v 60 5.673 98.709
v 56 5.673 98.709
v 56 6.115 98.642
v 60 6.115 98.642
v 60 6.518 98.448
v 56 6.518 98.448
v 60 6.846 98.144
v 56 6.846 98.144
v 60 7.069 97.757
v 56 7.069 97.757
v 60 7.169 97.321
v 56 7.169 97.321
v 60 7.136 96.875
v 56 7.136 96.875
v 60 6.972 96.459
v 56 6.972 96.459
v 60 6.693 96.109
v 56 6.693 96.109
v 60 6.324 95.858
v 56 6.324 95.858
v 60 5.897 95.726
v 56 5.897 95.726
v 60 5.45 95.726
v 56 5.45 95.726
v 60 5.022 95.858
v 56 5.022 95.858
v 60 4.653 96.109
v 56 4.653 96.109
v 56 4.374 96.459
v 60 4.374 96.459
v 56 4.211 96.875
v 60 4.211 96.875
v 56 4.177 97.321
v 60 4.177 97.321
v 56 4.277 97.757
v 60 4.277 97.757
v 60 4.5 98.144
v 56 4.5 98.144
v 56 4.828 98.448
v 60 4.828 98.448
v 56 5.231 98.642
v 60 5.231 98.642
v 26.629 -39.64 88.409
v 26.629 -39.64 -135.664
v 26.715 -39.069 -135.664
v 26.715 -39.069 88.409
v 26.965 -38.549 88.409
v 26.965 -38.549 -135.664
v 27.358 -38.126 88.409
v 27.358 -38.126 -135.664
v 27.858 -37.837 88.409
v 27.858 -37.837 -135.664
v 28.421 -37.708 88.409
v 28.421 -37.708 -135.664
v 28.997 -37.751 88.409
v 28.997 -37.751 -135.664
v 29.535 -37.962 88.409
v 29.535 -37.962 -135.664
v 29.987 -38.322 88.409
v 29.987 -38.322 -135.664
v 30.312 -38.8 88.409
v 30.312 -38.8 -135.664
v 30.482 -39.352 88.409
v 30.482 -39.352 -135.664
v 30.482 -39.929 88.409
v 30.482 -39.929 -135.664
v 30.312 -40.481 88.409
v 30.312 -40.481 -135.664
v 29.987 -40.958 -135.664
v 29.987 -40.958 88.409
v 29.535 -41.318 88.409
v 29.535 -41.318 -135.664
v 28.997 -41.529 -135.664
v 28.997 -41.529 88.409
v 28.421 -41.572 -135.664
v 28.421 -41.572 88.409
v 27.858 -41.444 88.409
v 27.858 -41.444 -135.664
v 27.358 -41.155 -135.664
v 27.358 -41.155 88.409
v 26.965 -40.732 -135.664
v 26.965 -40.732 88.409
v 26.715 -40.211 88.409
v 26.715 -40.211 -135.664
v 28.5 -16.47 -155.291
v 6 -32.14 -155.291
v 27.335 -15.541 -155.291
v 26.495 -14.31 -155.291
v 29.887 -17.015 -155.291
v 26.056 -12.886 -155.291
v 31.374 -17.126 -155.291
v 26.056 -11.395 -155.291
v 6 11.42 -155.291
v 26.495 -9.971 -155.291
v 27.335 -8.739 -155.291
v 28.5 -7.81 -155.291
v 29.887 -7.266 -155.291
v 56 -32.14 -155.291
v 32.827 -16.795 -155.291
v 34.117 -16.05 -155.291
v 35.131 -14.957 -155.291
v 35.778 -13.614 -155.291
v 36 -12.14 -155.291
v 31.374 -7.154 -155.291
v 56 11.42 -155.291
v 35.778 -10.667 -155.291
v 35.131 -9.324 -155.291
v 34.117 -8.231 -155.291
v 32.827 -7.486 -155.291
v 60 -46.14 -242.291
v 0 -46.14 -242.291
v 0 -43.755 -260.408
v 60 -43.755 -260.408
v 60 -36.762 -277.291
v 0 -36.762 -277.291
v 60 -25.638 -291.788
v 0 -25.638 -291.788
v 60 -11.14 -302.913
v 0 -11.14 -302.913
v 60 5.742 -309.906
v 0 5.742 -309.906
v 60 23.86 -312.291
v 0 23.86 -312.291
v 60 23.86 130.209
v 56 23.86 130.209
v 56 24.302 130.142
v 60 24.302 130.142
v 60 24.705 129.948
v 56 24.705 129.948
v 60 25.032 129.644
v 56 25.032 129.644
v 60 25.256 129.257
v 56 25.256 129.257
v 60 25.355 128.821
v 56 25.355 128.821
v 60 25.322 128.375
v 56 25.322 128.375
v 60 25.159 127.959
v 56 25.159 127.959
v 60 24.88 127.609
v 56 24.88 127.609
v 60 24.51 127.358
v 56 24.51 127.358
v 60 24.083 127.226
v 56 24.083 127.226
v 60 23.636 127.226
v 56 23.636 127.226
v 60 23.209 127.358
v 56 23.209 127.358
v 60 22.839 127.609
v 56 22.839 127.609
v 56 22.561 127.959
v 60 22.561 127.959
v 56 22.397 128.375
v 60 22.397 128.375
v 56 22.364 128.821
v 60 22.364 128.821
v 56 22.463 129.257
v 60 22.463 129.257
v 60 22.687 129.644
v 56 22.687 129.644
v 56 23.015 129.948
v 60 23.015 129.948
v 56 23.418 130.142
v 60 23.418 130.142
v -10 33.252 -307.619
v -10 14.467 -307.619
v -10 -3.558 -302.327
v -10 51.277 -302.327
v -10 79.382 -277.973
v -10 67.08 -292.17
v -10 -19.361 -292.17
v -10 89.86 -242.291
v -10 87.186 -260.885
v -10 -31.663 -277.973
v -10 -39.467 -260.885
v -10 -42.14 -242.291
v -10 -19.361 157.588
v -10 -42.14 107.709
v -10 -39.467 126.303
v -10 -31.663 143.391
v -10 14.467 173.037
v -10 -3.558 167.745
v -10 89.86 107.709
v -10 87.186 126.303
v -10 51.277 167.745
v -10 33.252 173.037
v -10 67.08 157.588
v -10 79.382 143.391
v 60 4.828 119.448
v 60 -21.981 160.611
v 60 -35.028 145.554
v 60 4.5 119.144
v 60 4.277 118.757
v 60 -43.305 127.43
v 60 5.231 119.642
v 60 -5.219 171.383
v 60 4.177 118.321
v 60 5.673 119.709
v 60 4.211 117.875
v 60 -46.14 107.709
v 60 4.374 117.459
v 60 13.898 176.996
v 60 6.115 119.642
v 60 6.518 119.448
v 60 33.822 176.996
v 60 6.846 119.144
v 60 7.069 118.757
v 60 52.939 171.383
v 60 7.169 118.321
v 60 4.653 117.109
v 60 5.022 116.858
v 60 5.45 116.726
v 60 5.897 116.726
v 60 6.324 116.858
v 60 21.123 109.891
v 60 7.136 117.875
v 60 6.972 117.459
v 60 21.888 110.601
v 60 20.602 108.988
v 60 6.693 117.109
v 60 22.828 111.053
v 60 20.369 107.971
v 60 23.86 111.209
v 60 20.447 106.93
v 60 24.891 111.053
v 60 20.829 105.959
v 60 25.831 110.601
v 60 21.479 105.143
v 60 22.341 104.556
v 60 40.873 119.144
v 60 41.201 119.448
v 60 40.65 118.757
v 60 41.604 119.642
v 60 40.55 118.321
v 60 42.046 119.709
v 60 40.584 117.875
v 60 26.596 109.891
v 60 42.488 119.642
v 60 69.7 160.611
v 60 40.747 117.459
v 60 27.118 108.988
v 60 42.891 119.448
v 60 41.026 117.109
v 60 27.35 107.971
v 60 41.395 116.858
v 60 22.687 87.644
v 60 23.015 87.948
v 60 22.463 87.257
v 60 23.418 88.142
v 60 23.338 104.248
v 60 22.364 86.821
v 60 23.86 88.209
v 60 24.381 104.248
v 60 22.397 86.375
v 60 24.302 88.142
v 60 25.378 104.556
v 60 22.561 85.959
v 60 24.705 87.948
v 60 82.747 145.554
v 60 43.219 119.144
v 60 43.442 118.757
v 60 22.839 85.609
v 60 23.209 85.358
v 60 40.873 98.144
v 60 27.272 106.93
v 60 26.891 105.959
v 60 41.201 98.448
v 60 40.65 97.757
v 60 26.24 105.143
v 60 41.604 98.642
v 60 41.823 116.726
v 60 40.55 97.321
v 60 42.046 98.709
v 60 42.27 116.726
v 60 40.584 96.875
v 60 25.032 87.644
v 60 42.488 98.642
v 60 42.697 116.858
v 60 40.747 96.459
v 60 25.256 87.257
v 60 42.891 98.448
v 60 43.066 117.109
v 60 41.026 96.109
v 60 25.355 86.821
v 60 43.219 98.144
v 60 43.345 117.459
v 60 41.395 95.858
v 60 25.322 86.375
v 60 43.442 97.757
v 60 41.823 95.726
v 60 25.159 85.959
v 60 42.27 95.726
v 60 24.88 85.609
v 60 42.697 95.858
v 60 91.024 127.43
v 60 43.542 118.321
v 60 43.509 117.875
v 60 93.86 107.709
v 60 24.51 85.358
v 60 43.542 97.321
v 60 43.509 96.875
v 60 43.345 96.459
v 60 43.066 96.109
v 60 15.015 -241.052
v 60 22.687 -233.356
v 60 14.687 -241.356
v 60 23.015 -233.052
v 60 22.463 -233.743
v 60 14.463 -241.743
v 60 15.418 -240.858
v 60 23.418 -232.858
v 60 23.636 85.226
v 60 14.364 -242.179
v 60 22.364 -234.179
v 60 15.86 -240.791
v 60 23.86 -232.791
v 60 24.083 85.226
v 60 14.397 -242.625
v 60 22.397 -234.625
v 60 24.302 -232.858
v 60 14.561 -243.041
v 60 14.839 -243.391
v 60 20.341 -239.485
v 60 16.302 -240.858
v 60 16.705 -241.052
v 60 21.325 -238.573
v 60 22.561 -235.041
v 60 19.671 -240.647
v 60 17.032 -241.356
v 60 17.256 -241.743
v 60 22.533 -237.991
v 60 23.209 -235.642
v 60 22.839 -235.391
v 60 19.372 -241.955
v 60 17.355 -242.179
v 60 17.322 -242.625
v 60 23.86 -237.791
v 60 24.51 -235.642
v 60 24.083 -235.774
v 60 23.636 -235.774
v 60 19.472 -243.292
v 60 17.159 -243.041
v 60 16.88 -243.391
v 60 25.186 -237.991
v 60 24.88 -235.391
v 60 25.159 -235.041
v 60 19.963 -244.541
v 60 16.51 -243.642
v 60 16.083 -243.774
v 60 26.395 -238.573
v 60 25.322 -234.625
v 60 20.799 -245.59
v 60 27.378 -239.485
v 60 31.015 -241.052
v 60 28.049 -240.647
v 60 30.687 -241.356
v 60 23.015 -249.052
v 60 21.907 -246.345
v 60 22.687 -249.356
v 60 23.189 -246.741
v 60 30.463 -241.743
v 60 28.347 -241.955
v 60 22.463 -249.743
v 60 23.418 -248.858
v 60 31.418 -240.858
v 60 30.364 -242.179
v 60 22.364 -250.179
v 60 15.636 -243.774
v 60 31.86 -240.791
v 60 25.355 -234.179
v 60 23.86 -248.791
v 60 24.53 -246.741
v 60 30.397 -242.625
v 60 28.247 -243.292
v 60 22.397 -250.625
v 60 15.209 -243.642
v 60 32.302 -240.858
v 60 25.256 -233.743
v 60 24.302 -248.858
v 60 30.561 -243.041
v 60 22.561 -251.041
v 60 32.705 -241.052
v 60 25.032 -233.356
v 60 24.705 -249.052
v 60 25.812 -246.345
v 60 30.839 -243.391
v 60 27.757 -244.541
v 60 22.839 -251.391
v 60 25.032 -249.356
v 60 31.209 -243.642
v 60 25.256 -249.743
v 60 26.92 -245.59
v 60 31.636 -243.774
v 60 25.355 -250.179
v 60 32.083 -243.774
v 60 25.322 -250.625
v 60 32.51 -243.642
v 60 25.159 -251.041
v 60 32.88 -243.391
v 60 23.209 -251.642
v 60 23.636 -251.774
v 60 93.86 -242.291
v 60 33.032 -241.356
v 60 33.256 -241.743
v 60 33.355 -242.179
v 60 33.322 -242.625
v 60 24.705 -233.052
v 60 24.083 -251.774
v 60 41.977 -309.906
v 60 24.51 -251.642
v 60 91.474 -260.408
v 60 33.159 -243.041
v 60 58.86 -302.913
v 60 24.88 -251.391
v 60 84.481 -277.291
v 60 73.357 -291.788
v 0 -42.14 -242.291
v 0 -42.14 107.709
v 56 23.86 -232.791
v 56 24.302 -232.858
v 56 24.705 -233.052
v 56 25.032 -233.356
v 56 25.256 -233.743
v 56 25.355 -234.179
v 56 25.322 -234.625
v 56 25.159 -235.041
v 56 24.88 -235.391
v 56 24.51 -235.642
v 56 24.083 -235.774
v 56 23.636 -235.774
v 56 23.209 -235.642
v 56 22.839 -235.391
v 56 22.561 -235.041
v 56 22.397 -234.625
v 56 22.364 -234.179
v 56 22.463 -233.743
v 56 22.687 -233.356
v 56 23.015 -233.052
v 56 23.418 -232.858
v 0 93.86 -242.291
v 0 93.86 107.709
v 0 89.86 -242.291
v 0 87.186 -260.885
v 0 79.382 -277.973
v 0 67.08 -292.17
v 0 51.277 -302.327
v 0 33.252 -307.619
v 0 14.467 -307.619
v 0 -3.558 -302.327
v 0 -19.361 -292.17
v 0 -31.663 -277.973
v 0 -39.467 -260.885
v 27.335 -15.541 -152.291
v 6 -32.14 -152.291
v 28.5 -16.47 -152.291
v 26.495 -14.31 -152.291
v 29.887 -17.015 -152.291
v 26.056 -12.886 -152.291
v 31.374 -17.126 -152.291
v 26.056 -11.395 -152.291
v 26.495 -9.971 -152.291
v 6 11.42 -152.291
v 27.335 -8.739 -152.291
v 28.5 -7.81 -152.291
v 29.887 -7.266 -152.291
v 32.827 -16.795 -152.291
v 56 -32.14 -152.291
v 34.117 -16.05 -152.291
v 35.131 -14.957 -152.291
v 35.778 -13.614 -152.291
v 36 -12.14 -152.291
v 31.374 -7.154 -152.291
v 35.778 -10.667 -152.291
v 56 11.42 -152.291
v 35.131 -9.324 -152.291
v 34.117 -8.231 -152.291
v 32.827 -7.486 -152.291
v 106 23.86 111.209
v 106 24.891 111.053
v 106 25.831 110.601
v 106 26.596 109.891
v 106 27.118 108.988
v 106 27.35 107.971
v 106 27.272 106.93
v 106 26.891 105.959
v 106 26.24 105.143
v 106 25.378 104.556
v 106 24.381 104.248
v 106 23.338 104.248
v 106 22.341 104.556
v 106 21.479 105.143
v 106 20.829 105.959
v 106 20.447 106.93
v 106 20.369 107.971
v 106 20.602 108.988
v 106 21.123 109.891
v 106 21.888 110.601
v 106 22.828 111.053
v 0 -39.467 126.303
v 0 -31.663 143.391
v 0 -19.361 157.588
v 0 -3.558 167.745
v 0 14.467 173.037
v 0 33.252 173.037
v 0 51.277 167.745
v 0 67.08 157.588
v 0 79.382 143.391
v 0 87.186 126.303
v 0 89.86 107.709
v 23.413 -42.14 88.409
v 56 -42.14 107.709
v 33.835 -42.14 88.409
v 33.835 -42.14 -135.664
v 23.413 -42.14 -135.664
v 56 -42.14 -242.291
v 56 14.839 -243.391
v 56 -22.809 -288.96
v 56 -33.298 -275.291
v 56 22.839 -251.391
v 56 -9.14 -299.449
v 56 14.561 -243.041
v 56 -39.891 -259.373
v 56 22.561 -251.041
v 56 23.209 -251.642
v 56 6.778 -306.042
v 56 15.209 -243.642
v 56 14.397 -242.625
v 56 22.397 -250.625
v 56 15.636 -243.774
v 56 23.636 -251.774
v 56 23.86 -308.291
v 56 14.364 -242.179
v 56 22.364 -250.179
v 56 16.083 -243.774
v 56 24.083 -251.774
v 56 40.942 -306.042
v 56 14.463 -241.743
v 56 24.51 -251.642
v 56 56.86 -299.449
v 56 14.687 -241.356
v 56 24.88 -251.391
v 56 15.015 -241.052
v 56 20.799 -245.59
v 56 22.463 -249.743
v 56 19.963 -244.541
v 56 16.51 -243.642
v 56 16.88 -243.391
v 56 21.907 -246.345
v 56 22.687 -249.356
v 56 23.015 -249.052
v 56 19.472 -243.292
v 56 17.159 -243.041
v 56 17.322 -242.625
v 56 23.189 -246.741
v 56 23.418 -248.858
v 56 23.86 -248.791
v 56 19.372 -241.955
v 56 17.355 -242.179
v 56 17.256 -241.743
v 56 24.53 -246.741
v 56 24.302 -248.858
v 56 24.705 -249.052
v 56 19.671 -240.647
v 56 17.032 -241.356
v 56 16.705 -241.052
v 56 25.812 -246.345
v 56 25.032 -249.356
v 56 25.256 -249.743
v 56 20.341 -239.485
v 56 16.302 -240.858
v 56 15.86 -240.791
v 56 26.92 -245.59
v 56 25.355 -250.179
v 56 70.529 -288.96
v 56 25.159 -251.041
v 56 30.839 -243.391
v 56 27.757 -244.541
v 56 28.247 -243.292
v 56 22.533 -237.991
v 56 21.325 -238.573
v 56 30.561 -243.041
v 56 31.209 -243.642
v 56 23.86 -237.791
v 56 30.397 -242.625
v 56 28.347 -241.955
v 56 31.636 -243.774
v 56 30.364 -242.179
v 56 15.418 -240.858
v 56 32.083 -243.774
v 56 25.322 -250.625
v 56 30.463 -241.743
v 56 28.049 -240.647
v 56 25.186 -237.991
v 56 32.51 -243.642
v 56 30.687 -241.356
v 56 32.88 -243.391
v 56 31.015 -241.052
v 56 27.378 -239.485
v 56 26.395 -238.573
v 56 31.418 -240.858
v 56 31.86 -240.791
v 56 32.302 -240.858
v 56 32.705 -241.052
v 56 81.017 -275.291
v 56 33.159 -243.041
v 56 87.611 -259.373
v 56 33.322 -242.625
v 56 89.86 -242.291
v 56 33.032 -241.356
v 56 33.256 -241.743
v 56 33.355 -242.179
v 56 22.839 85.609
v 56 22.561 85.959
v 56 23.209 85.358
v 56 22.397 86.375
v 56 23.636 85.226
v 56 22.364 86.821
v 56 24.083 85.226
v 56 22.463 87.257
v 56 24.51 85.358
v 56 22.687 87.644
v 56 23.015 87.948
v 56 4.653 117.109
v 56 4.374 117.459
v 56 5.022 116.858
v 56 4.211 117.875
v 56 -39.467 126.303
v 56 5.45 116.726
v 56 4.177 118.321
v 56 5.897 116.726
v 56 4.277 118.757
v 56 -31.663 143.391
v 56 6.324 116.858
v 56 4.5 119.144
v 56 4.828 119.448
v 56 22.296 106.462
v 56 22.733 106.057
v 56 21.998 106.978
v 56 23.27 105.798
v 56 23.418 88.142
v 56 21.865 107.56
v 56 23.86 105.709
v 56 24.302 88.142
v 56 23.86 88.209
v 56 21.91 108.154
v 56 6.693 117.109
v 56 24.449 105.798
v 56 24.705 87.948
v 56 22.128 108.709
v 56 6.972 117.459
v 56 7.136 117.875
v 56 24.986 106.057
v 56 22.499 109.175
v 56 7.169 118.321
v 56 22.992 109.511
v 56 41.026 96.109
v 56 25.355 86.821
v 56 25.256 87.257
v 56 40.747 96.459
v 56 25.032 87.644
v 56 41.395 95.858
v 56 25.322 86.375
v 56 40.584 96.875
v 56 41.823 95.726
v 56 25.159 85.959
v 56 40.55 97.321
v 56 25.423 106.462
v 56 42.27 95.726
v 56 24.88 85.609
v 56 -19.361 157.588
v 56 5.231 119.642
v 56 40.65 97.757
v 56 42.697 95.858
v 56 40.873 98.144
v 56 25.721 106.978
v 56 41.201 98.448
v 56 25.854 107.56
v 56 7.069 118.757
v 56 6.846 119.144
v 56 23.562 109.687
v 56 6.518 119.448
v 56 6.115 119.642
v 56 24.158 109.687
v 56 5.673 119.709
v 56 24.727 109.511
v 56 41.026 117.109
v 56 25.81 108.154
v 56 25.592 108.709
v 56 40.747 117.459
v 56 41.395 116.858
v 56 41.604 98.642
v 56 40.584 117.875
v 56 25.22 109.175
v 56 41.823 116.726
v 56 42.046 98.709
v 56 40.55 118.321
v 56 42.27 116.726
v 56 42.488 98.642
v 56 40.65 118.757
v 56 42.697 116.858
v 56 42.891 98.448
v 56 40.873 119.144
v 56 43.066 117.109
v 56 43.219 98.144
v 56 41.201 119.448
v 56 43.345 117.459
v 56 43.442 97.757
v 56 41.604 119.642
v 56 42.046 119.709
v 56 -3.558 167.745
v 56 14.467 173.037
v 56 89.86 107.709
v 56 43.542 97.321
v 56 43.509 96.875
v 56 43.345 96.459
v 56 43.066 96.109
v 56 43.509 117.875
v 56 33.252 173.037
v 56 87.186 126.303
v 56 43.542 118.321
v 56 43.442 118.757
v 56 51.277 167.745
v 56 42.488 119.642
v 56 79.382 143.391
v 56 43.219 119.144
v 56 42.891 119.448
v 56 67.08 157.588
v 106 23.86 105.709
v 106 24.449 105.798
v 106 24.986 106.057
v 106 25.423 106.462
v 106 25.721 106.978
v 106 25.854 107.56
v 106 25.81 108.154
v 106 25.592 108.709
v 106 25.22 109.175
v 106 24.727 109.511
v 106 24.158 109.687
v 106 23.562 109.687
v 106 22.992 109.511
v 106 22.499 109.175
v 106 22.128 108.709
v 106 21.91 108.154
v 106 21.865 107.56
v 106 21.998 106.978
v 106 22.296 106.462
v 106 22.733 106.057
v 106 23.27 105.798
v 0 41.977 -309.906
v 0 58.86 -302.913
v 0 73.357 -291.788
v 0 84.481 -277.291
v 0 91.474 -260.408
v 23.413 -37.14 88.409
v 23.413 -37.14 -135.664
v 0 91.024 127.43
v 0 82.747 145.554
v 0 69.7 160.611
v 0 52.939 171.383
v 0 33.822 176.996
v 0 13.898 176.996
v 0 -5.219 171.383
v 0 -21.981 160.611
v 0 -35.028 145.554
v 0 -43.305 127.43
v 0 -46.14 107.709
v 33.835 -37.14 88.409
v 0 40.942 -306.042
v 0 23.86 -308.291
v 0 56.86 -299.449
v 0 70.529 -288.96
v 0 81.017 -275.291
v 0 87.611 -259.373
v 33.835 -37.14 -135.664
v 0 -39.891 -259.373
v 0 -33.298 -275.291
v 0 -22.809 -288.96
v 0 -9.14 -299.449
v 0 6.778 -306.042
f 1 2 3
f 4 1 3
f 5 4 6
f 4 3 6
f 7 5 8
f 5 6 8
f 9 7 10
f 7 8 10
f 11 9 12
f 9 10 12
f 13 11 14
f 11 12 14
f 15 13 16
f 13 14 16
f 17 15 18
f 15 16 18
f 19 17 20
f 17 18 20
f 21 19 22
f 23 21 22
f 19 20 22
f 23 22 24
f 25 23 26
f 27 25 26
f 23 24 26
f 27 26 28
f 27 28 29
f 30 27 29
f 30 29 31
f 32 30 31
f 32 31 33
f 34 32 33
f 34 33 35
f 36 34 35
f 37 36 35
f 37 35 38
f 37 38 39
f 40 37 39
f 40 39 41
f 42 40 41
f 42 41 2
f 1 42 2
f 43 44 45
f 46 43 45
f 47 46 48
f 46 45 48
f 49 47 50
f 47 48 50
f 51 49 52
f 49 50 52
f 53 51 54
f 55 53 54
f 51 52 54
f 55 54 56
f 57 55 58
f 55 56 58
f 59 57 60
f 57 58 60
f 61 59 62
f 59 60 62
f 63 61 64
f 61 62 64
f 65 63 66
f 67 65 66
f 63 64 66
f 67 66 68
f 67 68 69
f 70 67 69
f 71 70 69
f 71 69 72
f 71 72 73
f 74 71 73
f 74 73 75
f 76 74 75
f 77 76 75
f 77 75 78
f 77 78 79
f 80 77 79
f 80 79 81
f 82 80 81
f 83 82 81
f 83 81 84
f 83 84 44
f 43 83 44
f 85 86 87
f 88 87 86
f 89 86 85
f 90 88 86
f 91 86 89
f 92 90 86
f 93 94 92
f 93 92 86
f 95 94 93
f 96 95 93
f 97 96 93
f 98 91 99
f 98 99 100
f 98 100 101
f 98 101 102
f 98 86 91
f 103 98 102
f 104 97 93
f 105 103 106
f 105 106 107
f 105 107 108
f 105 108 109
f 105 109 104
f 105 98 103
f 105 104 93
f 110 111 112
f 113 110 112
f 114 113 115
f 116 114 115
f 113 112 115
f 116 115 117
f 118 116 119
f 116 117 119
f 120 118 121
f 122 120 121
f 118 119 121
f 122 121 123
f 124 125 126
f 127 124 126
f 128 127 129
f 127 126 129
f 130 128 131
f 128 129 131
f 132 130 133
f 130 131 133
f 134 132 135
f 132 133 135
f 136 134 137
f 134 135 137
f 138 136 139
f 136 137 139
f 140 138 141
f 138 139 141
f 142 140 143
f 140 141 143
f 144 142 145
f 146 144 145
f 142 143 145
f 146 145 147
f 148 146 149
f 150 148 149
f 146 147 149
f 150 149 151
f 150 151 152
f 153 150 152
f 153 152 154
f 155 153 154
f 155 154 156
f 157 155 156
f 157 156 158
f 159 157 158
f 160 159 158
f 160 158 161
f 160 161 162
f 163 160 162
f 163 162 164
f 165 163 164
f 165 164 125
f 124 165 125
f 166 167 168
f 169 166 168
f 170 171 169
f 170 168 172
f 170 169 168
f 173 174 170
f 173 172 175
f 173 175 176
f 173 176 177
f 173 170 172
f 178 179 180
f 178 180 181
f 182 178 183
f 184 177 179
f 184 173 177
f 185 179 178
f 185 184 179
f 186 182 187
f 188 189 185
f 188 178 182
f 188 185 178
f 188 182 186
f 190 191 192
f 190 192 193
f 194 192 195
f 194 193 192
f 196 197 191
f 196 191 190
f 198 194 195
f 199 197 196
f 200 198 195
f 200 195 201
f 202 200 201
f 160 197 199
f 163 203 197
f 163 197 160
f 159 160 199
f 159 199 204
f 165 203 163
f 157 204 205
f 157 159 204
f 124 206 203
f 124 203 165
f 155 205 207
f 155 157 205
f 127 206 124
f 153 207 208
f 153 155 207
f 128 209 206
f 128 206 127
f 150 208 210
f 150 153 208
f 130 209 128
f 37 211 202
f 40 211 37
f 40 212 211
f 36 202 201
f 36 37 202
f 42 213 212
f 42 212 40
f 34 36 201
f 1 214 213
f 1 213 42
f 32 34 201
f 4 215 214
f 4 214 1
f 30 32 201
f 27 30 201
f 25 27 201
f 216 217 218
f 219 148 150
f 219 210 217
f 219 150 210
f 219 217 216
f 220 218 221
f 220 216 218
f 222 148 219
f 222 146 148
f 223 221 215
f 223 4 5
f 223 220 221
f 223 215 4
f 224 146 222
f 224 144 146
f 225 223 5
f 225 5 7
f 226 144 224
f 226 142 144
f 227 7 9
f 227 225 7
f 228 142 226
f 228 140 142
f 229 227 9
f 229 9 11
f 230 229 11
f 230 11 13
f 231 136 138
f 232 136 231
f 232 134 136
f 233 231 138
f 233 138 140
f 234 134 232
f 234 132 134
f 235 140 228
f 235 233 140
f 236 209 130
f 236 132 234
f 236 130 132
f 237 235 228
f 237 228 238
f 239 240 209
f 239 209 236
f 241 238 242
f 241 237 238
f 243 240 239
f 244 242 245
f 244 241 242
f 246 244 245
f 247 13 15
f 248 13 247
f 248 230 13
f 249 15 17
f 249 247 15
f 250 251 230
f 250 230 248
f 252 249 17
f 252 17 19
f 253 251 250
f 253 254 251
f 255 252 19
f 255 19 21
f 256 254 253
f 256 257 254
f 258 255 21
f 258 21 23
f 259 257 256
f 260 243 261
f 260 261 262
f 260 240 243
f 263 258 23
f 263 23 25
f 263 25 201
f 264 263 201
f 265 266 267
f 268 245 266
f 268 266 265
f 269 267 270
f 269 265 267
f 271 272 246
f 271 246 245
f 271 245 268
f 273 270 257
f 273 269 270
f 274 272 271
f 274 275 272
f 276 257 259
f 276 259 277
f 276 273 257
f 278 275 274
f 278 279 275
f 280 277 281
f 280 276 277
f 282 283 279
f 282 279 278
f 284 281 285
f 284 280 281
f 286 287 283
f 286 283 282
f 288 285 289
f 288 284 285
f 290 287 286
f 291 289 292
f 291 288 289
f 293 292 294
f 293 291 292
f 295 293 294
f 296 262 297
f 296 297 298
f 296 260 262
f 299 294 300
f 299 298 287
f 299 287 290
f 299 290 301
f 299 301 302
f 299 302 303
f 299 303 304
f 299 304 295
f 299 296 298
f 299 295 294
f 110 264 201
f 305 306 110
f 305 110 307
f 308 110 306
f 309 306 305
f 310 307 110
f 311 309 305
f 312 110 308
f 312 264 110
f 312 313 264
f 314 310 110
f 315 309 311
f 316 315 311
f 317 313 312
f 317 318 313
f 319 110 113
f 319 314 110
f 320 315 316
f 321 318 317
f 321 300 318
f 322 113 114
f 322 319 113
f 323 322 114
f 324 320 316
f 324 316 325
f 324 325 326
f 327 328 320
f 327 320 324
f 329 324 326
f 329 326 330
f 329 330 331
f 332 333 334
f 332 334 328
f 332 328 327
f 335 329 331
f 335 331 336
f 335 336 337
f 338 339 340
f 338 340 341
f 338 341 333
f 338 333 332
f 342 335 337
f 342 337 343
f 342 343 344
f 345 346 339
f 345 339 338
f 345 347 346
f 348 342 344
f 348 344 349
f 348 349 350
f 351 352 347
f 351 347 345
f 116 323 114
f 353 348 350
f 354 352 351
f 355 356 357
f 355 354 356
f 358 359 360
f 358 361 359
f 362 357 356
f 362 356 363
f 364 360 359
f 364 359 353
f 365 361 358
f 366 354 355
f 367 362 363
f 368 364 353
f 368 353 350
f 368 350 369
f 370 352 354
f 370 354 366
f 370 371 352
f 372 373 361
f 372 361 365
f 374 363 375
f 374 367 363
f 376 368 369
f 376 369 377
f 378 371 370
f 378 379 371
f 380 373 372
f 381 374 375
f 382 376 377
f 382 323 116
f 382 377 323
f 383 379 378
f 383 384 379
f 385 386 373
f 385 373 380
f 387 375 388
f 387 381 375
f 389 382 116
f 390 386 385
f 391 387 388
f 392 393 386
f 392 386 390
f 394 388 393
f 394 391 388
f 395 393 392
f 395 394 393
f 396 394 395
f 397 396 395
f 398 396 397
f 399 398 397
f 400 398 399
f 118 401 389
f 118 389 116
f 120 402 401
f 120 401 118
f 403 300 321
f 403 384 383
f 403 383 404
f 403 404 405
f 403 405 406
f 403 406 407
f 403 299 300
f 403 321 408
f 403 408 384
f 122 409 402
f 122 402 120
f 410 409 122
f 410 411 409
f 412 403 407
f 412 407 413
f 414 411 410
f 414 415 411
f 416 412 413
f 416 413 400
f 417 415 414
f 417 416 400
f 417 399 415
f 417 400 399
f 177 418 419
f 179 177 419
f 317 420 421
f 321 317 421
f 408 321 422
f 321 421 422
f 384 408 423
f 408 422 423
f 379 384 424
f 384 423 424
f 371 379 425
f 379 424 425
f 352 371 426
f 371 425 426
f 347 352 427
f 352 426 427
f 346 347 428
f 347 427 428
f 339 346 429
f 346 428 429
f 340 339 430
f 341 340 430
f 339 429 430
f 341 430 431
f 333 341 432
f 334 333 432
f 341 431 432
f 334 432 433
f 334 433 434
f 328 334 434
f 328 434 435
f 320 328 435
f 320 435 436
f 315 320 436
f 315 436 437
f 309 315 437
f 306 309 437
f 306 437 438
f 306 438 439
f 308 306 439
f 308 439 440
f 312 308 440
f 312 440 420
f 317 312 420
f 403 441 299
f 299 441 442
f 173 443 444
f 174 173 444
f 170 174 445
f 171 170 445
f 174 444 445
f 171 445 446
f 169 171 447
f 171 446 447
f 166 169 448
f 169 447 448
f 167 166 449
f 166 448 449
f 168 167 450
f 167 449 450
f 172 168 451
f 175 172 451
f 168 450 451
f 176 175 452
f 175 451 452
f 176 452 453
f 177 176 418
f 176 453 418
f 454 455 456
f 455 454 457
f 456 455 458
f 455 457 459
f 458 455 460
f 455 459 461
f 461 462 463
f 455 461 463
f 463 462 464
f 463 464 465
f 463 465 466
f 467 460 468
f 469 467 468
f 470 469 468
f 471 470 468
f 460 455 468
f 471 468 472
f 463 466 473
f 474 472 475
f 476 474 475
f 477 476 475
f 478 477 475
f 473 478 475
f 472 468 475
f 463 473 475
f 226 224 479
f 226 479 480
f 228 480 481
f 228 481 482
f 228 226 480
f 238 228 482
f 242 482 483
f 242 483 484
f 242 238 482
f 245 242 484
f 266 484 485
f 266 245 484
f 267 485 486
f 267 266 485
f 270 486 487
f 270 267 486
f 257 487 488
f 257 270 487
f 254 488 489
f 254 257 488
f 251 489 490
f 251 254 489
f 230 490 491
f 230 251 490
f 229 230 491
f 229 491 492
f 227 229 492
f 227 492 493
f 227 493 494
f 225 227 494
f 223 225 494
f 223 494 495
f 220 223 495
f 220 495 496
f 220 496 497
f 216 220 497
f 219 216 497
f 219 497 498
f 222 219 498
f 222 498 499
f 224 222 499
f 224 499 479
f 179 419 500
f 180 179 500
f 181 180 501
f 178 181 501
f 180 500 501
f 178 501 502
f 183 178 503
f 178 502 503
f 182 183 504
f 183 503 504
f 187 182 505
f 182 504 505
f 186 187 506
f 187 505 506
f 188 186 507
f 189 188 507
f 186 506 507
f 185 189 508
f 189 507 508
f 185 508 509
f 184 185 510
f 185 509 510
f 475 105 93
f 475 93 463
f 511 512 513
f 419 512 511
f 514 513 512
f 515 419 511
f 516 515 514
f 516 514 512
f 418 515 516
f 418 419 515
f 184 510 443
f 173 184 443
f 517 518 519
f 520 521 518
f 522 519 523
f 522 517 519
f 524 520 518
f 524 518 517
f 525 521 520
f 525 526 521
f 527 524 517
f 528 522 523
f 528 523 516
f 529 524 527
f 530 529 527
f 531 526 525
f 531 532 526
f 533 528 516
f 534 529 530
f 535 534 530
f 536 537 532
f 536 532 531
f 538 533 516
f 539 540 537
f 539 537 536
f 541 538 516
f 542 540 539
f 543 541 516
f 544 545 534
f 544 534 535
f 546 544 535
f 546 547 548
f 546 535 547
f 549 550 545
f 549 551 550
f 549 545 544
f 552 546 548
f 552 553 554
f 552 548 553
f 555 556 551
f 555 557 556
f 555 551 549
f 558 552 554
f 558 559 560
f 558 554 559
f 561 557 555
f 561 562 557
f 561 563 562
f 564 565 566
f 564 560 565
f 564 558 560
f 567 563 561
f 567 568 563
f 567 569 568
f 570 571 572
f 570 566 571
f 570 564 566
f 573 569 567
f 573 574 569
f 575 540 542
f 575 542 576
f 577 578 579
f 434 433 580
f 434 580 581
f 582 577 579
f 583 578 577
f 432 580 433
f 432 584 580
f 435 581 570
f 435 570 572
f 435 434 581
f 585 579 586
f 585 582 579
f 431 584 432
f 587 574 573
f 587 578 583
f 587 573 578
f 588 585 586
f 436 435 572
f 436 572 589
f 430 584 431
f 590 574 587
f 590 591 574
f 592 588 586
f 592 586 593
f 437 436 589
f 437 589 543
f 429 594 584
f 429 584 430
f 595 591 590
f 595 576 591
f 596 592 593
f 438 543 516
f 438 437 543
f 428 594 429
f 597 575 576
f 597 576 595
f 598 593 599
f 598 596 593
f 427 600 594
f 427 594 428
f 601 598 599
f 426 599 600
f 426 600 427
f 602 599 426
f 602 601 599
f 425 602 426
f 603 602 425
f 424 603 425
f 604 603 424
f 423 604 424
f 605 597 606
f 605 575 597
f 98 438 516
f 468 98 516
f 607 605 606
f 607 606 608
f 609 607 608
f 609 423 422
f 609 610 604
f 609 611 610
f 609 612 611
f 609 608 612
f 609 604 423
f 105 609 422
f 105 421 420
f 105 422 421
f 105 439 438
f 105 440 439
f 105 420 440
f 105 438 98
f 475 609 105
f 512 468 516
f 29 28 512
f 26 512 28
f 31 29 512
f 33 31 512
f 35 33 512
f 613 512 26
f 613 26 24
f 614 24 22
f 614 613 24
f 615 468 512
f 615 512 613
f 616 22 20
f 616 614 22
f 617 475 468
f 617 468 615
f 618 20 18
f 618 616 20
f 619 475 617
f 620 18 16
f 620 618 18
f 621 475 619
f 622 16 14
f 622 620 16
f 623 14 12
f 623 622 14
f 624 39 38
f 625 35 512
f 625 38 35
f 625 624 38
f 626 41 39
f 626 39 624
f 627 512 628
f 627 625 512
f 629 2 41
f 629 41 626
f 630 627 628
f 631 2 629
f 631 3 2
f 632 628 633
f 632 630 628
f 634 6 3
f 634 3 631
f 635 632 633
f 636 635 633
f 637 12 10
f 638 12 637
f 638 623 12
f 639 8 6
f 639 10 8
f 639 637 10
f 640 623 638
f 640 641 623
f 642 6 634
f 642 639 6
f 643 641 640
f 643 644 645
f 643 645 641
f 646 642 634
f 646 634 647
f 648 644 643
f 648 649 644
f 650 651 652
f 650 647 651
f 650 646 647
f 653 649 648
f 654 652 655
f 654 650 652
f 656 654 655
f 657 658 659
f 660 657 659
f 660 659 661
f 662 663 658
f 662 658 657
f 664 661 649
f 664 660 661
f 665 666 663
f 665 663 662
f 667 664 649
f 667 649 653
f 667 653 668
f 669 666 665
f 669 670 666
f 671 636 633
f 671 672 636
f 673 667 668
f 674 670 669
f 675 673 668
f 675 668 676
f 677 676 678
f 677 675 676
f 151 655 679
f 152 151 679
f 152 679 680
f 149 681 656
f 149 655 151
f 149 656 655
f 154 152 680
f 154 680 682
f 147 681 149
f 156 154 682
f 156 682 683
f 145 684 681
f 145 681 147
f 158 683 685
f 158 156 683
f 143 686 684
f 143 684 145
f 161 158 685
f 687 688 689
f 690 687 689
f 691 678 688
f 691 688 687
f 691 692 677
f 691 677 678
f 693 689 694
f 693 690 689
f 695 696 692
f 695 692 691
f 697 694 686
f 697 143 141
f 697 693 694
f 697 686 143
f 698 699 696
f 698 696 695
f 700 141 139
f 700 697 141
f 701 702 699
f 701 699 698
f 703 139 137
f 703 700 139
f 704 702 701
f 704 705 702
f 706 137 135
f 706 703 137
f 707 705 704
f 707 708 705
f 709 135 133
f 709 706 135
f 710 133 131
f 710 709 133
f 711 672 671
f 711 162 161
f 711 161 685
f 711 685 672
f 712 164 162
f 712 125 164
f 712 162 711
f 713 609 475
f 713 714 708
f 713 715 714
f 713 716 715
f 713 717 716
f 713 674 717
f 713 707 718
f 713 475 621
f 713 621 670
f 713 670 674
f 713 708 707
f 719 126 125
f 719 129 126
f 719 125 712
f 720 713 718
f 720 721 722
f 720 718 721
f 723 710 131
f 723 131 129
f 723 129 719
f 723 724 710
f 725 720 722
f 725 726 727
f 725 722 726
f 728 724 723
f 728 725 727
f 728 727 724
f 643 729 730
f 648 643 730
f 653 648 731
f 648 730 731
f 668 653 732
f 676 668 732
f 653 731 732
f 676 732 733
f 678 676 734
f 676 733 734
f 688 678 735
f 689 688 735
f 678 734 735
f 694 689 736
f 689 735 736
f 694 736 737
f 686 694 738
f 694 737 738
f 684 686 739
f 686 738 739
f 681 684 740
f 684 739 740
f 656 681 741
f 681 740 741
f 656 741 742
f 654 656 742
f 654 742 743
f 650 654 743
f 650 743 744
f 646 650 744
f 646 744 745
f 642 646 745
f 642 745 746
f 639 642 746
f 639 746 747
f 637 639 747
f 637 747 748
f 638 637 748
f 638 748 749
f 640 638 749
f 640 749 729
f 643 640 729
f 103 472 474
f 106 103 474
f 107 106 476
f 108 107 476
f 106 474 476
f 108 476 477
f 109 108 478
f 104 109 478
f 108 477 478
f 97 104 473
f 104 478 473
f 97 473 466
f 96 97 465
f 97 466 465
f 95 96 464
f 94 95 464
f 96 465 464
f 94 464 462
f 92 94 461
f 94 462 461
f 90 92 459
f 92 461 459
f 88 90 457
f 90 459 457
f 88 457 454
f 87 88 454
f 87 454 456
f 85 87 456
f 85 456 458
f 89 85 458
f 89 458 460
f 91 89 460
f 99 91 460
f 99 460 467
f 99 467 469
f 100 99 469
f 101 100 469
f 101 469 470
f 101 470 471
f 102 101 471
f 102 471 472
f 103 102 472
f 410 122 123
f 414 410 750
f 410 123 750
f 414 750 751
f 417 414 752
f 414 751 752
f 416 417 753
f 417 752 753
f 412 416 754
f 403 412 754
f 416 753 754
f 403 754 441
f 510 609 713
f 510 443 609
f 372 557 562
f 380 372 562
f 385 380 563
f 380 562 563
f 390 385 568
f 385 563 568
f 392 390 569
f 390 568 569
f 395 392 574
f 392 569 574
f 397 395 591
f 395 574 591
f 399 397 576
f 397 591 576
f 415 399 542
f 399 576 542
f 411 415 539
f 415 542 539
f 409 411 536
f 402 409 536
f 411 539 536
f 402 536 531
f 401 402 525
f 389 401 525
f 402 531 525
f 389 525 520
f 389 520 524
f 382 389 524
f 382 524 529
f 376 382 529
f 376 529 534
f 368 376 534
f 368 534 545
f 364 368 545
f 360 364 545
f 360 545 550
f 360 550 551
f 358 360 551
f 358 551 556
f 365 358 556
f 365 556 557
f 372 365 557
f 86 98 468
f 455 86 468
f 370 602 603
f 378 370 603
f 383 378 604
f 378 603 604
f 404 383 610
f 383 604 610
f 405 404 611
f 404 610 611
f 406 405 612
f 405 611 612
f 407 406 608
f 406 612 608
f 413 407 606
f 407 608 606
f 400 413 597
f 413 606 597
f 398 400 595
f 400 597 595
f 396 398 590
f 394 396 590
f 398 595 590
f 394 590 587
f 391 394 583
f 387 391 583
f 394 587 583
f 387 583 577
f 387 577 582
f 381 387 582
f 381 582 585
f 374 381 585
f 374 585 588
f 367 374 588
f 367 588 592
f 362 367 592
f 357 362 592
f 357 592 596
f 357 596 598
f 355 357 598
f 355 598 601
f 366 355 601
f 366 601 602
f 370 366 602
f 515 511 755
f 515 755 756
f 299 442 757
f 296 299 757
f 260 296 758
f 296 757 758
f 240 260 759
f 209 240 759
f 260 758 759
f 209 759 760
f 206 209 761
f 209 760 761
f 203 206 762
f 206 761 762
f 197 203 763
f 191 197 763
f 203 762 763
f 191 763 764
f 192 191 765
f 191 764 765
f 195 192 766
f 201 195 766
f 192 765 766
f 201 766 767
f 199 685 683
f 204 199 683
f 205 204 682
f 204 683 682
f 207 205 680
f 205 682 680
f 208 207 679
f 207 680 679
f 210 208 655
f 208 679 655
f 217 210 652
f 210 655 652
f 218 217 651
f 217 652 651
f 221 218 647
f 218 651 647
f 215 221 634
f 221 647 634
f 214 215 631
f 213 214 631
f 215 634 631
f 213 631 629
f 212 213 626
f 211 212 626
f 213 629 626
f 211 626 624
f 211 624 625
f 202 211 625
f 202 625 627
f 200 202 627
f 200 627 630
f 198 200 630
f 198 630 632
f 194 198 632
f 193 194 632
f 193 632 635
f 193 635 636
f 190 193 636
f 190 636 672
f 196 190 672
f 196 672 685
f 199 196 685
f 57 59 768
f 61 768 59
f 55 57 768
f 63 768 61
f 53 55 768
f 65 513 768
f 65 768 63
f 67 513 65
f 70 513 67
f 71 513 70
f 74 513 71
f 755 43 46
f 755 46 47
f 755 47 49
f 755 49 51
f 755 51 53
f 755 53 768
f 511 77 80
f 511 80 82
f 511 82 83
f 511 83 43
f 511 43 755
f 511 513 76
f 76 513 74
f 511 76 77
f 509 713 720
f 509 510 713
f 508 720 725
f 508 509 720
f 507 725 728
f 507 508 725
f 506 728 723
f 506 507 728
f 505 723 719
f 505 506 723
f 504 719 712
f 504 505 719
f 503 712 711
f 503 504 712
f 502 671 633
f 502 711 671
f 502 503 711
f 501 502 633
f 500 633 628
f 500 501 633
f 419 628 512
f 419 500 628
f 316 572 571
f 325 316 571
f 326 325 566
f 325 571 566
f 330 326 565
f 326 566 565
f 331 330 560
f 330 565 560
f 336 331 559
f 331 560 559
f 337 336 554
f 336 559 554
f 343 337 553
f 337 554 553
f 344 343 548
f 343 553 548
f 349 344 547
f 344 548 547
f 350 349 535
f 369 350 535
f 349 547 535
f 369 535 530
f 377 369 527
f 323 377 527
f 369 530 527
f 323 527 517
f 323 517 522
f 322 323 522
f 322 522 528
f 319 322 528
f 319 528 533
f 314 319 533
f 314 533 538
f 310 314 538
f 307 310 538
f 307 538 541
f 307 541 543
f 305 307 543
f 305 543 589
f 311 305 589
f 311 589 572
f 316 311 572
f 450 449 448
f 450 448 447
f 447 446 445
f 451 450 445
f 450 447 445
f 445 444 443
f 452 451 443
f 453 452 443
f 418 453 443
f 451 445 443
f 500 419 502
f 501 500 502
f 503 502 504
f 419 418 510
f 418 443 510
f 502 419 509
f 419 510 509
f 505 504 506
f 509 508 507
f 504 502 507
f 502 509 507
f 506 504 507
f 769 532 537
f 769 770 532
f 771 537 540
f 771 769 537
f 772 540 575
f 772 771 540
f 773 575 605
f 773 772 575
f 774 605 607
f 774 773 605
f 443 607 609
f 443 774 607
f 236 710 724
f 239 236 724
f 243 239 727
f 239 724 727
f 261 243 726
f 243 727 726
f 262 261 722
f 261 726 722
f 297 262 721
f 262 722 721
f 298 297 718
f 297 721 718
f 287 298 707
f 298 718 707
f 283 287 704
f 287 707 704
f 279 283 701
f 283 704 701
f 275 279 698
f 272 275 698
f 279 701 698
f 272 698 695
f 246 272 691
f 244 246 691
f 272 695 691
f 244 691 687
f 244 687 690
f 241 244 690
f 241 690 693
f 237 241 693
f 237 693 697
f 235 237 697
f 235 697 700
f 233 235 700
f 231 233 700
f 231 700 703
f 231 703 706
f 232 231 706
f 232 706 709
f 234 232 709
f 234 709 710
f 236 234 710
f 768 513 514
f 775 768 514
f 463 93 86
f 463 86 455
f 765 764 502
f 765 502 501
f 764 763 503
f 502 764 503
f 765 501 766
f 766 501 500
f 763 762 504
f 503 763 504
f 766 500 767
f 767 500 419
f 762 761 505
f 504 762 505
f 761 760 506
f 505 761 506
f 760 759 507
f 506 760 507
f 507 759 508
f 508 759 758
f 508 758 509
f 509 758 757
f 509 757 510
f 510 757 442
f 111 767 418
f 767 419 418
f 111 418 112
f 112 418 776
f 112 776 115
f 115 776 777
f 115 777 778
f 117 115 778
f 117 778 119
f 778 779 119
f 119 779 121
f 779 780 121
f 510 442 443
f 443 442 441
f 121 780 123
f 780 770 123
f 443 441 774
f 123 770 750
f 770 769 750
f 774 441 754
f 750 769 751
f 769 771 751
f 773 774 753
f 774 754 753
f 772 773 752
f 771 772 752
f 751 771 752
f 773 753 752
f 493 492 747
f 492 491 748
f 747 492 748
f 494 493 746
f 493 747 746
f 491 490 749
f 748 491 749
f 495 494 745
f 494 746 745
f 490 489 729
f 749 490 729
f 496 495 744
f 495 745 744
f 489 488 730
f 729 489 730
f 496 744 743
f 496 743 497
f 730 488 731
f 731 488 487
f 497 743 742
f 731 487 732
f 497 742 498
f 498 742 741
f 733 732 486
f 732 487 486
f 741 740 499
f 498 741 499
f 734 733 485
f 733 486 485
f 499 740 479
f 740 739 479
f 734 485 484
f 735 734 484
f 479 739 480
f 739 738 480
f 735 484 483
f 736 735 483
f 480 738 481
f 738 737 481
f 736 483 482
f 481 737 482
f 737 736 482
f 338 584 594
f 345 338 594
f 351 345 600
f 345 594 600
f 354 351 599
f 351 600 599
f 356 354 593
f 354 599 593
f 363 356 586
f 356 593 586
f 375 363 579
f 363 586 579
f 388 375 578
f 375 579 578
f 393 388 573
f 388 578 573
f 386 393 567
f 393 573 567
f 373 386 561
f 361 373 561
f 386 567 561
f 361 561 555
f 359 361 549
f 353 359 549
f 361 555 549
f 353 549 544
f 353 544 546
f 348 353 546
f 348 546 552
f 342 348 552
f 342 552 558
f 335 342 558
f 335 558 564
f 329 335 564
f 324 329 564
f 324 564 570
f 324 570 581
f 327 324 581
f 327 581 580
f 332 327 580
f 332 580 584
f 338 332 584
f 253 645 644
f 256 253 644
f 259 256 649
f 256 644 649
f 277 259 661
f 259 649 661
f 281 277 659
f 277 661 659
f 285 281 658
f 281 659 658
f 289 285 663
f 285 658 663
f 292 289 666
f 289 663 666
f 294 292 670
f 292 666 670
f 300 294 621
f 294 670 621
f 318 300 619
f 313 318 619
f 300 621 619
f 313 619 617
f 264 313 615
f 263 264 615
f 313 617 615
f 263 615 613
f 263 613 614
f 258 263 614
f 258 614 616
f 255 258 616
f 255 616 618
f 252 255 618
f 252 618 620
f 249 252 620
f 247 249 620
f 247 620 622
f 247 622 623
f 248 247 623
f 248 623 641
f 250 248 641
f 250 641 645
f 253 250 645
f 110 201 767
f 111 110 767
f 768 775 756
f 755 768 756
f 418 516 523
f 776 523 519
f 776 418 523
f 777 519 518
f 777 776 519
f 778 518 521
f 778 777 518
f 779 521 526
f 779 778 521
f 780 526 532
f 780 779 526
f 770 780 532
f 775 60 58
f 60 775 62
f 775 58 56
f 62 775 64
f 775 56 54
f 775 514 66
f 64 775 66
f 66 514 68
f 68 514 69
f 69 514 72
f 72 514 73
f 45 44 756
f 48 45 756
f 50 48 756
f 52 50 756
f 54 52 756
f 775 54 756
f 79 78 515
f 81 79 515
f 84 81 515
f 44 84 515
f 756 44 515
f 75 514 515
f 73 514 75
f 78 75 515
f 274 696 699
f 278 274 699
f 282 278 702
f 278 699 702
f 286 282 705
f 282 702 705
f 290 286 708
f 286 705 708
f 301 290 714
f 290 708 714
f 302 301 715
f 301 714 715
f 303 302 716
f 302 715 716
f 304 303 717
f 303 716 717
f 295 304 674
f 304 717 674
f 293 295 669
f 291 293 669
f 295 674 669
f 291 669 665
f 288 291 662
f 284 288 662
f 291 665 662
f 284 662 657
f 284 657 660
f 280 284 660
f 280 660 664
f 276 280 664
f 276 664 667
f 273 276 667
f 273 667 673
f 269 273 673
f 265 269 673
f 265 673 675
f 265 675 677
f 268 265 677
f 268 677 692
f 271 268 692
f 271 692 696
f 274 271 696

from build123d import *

# Parameters (mm, degrees)
BOSS_EXTRUDE1_DEPTH = 60
SHELL1_T            = -4
SKETCH4_R           = 1.5
CUT_EXTRUDE1_DEPTH  = 40
SKETCH6_R           = 4.5
CUT_EXTRUDE2_DEPTH  = 40
SKETCH7_R           = 1.5
CUT_EXTRUDE3_DEPTH  = 10
SKETCH8_R           = 3.5
BOSS_EXTRUDE2_DEPTH = 50
SKETCH9_W           = 3
SKETCH9_H           = 43.560021299
BOSS_EXTRUDE3_DEPTH = 50
SKETCH10_R          = 5
CUT_EXTRUDE4_DEPTH  = 30
BOSS_EXTRUDE4_DEPTH = 10
SKETCH13_R          = 2
CUT_EXTRUDE5_DEPTH  = 65
SKETCH17_W          = 10.421963941
SKETCH17_H          = 224.072224721
BOSS_EXTRUDE5_DEPTH = 9
SKETCH18_R          = 1.93755364
CUT_EXTRUDE6_DEPTH  = 239


with BuildPart() as part:
    # Sketch2 → Boss-Extrude1 (new body)
    with BuildSketch(Plane(origin=(0, 0, 0), x_dir=(0, 0, -1), z_dir=(1, 0, 0))):
        with BuildLine():
            Line((242.291021672, 93.859649123), (-107.708978328, 93.859649123))
            ThreePointArc((-107.708978328, 93.859649123), (-177.708978328, 23.859649123), (-107.708978328, -46.140350877))
            Line((-107.708978328, -46.140350877), (242.291021672, -46.140350877))
            ThreePointArc((242.291021672, -46.140350877), (312.291021672, 23.859649123), (242.291021672, 93.859649123))
        make_face()
    extrude(amount=BOSS_EXTRUDE1_DEPTH)

    # Shell1
    shell1_openings = [part.faces().sort_by_distance(p)[0] for p in [
        (0, 23.859649123, -67.291021672),
    ]]
    offset(amount=SHELL1_T, openings=shell1_openings, kind=Kind.INTERSECTION)

    # Sketch4 → Cut-Extrude1 (cut)
    with BuildSketch(Plane.ZY.offset(-56)):
        with Locations((-242.291021672, 31.859649123)):
            Circle(SKETCH4_R)
        with Locations((-250.291021672, 23.859649123)):
            Circle(SKETCH4_R)
        with Locations((-234.291021672, 23.859649123)):
            Circle(SKETCH4_R)
        with Locations((-242.291021672, 15.859649123)):
            Circle(SKETCH4_R)
    extrude(amount=-CUT_EXTRUDE1_DEPTH, mode=Mode.SUBTRACT)

    # Sketch6 → Cut-Extrude2 (cut)
    with BuildSketch(Plane.ZY.offset(-56)):
        with Locations((-242.291021672, 23.859649123)):
            Circle(SKETCH6_R)
    extrude(amount=-CUT_EXTRUDE2_DEPTH, mode=Mode.SUBTRACT)

    # Sketch7 → Cut-Extrude3 (cut)
    with BuildSketch(Plane.ZY.offset(-56)):
        with Locations((86.708978328, 23.859649123)):
            Circle(SKETCH7_R)
        with Locations((97.208978328, 42.046182602)):
            Circle(SKETCH7_R)
        with Locations((118.208978328, 42.046182602)):
            Circle(SKETCH7_R)
        with Locations((128.708978328, 23.859649123)):
            Circle(SKETCH7_R)
        with Locations((118.208978328, 5.673115643)):
            Circle(SKETCH7_R)
        with Locations((97.208978328, 5.673115643)):
            Circle(SKETCH7_R)
    extrude(amount=-CUT_EXTRUDE3_DEPTH, mode=Mode.SUBTRACT)

    # Sketch8 → Boss-Extrude2 (add)
    with BuildSketch(Plane.ZY.offset(-56)):
        with Locations((107.708978328, 23.859649123)):
            Circle(SKETCH8_R)
    extrude(amount=-BOSS_EXTRUDE2_DEPTH)

    # Sketch9 → Boss-Extrude3 (add)
    with BuildSketch(Plane.ZY.offset(-56)):
        with Locations((-153.791021672, -10.360340228)):
            Rectangle(SKETCH9_W, SKETCH9_H)
    extrude(amount=BOSS_EXTRUDE3_DEPTH)

    # Sketch10 → Cut-Extrude4 (cut)
    with BuildSketch(Plane.XY.offset(-152.291021672)):
        with Locations((31, -12.140350877)):
            Circle(SKETCH10_R)
    extrude(amount=-CUT_EXTRUDE4_DEPTH, mode=Mode.SUBTRACT)

    # Sketch13 → Cut-Extrude5 (cut)
    with BuildSketch(Plane(origin=(106, 0, 0), x_dir=(0, 0, -1), z_dir=(1, 0, 0))):
        with Locations((-107.708978328, 23.859649123)):
            Circle(SKETCH13_R)
    extrude(amount=-CUT_EXTRUDE5_DEPTH, mode=Mode.SUBTRACT)

    # Sketch17 → Boss-Extrude5 (add)
    with BuildSketch(Plane(origin=(0, -46.140350877, 0), x_dir=(-1, 0, 0), z_dir=(0, -1, 0))):
        with Locations((-28.624068245, 23.627411579)):
            Rectangle(SKETCH17_W, SKETCH17_H)
    extrude(amount=-BOSS_EXTRUDE5_DEPTH)

    # Sketch18 → Cut-Extrude6 (cut)
    with BuildSketch(Plane(origin=(0, 0, -135.66352394), x_dir=(-1, 0, 0), z_dir=(0, 0, -1))):
        with Locations((-28.566241777, -39.640350877)):
            Circle(SKETCH18_R)
    extrude(amount=-CUT_EXTRUDE6_DEPTH, mode=Mode.SUBTRACT)


with BuildPart() as body_2:
    # Sketch11 → Boss-Extrude4 (new body)
    with BuildSketch(Plane.ZY):
        with BuildLine():
            Line((107.708978328, 89.859649123), (-242.291021672, 89.859649123))
            ThreePointArc((-242.291021672, 89.859649123), (-308.291021672, 23.859649123), (-242.291021672, -42.140350877))
            Line((-242.291021672, -42.140350877), (107.708978328, -42.140350877))
            ThreePointArc((107.708978328, -42.140350877), (173.708978328, 23.859649123), (107.708978328, 89.859649123))
        make_face()
    extrude(amount=BOSS_EXTRUDE4_DEPTH)


solid = Compound([part.part, body_2.part])
